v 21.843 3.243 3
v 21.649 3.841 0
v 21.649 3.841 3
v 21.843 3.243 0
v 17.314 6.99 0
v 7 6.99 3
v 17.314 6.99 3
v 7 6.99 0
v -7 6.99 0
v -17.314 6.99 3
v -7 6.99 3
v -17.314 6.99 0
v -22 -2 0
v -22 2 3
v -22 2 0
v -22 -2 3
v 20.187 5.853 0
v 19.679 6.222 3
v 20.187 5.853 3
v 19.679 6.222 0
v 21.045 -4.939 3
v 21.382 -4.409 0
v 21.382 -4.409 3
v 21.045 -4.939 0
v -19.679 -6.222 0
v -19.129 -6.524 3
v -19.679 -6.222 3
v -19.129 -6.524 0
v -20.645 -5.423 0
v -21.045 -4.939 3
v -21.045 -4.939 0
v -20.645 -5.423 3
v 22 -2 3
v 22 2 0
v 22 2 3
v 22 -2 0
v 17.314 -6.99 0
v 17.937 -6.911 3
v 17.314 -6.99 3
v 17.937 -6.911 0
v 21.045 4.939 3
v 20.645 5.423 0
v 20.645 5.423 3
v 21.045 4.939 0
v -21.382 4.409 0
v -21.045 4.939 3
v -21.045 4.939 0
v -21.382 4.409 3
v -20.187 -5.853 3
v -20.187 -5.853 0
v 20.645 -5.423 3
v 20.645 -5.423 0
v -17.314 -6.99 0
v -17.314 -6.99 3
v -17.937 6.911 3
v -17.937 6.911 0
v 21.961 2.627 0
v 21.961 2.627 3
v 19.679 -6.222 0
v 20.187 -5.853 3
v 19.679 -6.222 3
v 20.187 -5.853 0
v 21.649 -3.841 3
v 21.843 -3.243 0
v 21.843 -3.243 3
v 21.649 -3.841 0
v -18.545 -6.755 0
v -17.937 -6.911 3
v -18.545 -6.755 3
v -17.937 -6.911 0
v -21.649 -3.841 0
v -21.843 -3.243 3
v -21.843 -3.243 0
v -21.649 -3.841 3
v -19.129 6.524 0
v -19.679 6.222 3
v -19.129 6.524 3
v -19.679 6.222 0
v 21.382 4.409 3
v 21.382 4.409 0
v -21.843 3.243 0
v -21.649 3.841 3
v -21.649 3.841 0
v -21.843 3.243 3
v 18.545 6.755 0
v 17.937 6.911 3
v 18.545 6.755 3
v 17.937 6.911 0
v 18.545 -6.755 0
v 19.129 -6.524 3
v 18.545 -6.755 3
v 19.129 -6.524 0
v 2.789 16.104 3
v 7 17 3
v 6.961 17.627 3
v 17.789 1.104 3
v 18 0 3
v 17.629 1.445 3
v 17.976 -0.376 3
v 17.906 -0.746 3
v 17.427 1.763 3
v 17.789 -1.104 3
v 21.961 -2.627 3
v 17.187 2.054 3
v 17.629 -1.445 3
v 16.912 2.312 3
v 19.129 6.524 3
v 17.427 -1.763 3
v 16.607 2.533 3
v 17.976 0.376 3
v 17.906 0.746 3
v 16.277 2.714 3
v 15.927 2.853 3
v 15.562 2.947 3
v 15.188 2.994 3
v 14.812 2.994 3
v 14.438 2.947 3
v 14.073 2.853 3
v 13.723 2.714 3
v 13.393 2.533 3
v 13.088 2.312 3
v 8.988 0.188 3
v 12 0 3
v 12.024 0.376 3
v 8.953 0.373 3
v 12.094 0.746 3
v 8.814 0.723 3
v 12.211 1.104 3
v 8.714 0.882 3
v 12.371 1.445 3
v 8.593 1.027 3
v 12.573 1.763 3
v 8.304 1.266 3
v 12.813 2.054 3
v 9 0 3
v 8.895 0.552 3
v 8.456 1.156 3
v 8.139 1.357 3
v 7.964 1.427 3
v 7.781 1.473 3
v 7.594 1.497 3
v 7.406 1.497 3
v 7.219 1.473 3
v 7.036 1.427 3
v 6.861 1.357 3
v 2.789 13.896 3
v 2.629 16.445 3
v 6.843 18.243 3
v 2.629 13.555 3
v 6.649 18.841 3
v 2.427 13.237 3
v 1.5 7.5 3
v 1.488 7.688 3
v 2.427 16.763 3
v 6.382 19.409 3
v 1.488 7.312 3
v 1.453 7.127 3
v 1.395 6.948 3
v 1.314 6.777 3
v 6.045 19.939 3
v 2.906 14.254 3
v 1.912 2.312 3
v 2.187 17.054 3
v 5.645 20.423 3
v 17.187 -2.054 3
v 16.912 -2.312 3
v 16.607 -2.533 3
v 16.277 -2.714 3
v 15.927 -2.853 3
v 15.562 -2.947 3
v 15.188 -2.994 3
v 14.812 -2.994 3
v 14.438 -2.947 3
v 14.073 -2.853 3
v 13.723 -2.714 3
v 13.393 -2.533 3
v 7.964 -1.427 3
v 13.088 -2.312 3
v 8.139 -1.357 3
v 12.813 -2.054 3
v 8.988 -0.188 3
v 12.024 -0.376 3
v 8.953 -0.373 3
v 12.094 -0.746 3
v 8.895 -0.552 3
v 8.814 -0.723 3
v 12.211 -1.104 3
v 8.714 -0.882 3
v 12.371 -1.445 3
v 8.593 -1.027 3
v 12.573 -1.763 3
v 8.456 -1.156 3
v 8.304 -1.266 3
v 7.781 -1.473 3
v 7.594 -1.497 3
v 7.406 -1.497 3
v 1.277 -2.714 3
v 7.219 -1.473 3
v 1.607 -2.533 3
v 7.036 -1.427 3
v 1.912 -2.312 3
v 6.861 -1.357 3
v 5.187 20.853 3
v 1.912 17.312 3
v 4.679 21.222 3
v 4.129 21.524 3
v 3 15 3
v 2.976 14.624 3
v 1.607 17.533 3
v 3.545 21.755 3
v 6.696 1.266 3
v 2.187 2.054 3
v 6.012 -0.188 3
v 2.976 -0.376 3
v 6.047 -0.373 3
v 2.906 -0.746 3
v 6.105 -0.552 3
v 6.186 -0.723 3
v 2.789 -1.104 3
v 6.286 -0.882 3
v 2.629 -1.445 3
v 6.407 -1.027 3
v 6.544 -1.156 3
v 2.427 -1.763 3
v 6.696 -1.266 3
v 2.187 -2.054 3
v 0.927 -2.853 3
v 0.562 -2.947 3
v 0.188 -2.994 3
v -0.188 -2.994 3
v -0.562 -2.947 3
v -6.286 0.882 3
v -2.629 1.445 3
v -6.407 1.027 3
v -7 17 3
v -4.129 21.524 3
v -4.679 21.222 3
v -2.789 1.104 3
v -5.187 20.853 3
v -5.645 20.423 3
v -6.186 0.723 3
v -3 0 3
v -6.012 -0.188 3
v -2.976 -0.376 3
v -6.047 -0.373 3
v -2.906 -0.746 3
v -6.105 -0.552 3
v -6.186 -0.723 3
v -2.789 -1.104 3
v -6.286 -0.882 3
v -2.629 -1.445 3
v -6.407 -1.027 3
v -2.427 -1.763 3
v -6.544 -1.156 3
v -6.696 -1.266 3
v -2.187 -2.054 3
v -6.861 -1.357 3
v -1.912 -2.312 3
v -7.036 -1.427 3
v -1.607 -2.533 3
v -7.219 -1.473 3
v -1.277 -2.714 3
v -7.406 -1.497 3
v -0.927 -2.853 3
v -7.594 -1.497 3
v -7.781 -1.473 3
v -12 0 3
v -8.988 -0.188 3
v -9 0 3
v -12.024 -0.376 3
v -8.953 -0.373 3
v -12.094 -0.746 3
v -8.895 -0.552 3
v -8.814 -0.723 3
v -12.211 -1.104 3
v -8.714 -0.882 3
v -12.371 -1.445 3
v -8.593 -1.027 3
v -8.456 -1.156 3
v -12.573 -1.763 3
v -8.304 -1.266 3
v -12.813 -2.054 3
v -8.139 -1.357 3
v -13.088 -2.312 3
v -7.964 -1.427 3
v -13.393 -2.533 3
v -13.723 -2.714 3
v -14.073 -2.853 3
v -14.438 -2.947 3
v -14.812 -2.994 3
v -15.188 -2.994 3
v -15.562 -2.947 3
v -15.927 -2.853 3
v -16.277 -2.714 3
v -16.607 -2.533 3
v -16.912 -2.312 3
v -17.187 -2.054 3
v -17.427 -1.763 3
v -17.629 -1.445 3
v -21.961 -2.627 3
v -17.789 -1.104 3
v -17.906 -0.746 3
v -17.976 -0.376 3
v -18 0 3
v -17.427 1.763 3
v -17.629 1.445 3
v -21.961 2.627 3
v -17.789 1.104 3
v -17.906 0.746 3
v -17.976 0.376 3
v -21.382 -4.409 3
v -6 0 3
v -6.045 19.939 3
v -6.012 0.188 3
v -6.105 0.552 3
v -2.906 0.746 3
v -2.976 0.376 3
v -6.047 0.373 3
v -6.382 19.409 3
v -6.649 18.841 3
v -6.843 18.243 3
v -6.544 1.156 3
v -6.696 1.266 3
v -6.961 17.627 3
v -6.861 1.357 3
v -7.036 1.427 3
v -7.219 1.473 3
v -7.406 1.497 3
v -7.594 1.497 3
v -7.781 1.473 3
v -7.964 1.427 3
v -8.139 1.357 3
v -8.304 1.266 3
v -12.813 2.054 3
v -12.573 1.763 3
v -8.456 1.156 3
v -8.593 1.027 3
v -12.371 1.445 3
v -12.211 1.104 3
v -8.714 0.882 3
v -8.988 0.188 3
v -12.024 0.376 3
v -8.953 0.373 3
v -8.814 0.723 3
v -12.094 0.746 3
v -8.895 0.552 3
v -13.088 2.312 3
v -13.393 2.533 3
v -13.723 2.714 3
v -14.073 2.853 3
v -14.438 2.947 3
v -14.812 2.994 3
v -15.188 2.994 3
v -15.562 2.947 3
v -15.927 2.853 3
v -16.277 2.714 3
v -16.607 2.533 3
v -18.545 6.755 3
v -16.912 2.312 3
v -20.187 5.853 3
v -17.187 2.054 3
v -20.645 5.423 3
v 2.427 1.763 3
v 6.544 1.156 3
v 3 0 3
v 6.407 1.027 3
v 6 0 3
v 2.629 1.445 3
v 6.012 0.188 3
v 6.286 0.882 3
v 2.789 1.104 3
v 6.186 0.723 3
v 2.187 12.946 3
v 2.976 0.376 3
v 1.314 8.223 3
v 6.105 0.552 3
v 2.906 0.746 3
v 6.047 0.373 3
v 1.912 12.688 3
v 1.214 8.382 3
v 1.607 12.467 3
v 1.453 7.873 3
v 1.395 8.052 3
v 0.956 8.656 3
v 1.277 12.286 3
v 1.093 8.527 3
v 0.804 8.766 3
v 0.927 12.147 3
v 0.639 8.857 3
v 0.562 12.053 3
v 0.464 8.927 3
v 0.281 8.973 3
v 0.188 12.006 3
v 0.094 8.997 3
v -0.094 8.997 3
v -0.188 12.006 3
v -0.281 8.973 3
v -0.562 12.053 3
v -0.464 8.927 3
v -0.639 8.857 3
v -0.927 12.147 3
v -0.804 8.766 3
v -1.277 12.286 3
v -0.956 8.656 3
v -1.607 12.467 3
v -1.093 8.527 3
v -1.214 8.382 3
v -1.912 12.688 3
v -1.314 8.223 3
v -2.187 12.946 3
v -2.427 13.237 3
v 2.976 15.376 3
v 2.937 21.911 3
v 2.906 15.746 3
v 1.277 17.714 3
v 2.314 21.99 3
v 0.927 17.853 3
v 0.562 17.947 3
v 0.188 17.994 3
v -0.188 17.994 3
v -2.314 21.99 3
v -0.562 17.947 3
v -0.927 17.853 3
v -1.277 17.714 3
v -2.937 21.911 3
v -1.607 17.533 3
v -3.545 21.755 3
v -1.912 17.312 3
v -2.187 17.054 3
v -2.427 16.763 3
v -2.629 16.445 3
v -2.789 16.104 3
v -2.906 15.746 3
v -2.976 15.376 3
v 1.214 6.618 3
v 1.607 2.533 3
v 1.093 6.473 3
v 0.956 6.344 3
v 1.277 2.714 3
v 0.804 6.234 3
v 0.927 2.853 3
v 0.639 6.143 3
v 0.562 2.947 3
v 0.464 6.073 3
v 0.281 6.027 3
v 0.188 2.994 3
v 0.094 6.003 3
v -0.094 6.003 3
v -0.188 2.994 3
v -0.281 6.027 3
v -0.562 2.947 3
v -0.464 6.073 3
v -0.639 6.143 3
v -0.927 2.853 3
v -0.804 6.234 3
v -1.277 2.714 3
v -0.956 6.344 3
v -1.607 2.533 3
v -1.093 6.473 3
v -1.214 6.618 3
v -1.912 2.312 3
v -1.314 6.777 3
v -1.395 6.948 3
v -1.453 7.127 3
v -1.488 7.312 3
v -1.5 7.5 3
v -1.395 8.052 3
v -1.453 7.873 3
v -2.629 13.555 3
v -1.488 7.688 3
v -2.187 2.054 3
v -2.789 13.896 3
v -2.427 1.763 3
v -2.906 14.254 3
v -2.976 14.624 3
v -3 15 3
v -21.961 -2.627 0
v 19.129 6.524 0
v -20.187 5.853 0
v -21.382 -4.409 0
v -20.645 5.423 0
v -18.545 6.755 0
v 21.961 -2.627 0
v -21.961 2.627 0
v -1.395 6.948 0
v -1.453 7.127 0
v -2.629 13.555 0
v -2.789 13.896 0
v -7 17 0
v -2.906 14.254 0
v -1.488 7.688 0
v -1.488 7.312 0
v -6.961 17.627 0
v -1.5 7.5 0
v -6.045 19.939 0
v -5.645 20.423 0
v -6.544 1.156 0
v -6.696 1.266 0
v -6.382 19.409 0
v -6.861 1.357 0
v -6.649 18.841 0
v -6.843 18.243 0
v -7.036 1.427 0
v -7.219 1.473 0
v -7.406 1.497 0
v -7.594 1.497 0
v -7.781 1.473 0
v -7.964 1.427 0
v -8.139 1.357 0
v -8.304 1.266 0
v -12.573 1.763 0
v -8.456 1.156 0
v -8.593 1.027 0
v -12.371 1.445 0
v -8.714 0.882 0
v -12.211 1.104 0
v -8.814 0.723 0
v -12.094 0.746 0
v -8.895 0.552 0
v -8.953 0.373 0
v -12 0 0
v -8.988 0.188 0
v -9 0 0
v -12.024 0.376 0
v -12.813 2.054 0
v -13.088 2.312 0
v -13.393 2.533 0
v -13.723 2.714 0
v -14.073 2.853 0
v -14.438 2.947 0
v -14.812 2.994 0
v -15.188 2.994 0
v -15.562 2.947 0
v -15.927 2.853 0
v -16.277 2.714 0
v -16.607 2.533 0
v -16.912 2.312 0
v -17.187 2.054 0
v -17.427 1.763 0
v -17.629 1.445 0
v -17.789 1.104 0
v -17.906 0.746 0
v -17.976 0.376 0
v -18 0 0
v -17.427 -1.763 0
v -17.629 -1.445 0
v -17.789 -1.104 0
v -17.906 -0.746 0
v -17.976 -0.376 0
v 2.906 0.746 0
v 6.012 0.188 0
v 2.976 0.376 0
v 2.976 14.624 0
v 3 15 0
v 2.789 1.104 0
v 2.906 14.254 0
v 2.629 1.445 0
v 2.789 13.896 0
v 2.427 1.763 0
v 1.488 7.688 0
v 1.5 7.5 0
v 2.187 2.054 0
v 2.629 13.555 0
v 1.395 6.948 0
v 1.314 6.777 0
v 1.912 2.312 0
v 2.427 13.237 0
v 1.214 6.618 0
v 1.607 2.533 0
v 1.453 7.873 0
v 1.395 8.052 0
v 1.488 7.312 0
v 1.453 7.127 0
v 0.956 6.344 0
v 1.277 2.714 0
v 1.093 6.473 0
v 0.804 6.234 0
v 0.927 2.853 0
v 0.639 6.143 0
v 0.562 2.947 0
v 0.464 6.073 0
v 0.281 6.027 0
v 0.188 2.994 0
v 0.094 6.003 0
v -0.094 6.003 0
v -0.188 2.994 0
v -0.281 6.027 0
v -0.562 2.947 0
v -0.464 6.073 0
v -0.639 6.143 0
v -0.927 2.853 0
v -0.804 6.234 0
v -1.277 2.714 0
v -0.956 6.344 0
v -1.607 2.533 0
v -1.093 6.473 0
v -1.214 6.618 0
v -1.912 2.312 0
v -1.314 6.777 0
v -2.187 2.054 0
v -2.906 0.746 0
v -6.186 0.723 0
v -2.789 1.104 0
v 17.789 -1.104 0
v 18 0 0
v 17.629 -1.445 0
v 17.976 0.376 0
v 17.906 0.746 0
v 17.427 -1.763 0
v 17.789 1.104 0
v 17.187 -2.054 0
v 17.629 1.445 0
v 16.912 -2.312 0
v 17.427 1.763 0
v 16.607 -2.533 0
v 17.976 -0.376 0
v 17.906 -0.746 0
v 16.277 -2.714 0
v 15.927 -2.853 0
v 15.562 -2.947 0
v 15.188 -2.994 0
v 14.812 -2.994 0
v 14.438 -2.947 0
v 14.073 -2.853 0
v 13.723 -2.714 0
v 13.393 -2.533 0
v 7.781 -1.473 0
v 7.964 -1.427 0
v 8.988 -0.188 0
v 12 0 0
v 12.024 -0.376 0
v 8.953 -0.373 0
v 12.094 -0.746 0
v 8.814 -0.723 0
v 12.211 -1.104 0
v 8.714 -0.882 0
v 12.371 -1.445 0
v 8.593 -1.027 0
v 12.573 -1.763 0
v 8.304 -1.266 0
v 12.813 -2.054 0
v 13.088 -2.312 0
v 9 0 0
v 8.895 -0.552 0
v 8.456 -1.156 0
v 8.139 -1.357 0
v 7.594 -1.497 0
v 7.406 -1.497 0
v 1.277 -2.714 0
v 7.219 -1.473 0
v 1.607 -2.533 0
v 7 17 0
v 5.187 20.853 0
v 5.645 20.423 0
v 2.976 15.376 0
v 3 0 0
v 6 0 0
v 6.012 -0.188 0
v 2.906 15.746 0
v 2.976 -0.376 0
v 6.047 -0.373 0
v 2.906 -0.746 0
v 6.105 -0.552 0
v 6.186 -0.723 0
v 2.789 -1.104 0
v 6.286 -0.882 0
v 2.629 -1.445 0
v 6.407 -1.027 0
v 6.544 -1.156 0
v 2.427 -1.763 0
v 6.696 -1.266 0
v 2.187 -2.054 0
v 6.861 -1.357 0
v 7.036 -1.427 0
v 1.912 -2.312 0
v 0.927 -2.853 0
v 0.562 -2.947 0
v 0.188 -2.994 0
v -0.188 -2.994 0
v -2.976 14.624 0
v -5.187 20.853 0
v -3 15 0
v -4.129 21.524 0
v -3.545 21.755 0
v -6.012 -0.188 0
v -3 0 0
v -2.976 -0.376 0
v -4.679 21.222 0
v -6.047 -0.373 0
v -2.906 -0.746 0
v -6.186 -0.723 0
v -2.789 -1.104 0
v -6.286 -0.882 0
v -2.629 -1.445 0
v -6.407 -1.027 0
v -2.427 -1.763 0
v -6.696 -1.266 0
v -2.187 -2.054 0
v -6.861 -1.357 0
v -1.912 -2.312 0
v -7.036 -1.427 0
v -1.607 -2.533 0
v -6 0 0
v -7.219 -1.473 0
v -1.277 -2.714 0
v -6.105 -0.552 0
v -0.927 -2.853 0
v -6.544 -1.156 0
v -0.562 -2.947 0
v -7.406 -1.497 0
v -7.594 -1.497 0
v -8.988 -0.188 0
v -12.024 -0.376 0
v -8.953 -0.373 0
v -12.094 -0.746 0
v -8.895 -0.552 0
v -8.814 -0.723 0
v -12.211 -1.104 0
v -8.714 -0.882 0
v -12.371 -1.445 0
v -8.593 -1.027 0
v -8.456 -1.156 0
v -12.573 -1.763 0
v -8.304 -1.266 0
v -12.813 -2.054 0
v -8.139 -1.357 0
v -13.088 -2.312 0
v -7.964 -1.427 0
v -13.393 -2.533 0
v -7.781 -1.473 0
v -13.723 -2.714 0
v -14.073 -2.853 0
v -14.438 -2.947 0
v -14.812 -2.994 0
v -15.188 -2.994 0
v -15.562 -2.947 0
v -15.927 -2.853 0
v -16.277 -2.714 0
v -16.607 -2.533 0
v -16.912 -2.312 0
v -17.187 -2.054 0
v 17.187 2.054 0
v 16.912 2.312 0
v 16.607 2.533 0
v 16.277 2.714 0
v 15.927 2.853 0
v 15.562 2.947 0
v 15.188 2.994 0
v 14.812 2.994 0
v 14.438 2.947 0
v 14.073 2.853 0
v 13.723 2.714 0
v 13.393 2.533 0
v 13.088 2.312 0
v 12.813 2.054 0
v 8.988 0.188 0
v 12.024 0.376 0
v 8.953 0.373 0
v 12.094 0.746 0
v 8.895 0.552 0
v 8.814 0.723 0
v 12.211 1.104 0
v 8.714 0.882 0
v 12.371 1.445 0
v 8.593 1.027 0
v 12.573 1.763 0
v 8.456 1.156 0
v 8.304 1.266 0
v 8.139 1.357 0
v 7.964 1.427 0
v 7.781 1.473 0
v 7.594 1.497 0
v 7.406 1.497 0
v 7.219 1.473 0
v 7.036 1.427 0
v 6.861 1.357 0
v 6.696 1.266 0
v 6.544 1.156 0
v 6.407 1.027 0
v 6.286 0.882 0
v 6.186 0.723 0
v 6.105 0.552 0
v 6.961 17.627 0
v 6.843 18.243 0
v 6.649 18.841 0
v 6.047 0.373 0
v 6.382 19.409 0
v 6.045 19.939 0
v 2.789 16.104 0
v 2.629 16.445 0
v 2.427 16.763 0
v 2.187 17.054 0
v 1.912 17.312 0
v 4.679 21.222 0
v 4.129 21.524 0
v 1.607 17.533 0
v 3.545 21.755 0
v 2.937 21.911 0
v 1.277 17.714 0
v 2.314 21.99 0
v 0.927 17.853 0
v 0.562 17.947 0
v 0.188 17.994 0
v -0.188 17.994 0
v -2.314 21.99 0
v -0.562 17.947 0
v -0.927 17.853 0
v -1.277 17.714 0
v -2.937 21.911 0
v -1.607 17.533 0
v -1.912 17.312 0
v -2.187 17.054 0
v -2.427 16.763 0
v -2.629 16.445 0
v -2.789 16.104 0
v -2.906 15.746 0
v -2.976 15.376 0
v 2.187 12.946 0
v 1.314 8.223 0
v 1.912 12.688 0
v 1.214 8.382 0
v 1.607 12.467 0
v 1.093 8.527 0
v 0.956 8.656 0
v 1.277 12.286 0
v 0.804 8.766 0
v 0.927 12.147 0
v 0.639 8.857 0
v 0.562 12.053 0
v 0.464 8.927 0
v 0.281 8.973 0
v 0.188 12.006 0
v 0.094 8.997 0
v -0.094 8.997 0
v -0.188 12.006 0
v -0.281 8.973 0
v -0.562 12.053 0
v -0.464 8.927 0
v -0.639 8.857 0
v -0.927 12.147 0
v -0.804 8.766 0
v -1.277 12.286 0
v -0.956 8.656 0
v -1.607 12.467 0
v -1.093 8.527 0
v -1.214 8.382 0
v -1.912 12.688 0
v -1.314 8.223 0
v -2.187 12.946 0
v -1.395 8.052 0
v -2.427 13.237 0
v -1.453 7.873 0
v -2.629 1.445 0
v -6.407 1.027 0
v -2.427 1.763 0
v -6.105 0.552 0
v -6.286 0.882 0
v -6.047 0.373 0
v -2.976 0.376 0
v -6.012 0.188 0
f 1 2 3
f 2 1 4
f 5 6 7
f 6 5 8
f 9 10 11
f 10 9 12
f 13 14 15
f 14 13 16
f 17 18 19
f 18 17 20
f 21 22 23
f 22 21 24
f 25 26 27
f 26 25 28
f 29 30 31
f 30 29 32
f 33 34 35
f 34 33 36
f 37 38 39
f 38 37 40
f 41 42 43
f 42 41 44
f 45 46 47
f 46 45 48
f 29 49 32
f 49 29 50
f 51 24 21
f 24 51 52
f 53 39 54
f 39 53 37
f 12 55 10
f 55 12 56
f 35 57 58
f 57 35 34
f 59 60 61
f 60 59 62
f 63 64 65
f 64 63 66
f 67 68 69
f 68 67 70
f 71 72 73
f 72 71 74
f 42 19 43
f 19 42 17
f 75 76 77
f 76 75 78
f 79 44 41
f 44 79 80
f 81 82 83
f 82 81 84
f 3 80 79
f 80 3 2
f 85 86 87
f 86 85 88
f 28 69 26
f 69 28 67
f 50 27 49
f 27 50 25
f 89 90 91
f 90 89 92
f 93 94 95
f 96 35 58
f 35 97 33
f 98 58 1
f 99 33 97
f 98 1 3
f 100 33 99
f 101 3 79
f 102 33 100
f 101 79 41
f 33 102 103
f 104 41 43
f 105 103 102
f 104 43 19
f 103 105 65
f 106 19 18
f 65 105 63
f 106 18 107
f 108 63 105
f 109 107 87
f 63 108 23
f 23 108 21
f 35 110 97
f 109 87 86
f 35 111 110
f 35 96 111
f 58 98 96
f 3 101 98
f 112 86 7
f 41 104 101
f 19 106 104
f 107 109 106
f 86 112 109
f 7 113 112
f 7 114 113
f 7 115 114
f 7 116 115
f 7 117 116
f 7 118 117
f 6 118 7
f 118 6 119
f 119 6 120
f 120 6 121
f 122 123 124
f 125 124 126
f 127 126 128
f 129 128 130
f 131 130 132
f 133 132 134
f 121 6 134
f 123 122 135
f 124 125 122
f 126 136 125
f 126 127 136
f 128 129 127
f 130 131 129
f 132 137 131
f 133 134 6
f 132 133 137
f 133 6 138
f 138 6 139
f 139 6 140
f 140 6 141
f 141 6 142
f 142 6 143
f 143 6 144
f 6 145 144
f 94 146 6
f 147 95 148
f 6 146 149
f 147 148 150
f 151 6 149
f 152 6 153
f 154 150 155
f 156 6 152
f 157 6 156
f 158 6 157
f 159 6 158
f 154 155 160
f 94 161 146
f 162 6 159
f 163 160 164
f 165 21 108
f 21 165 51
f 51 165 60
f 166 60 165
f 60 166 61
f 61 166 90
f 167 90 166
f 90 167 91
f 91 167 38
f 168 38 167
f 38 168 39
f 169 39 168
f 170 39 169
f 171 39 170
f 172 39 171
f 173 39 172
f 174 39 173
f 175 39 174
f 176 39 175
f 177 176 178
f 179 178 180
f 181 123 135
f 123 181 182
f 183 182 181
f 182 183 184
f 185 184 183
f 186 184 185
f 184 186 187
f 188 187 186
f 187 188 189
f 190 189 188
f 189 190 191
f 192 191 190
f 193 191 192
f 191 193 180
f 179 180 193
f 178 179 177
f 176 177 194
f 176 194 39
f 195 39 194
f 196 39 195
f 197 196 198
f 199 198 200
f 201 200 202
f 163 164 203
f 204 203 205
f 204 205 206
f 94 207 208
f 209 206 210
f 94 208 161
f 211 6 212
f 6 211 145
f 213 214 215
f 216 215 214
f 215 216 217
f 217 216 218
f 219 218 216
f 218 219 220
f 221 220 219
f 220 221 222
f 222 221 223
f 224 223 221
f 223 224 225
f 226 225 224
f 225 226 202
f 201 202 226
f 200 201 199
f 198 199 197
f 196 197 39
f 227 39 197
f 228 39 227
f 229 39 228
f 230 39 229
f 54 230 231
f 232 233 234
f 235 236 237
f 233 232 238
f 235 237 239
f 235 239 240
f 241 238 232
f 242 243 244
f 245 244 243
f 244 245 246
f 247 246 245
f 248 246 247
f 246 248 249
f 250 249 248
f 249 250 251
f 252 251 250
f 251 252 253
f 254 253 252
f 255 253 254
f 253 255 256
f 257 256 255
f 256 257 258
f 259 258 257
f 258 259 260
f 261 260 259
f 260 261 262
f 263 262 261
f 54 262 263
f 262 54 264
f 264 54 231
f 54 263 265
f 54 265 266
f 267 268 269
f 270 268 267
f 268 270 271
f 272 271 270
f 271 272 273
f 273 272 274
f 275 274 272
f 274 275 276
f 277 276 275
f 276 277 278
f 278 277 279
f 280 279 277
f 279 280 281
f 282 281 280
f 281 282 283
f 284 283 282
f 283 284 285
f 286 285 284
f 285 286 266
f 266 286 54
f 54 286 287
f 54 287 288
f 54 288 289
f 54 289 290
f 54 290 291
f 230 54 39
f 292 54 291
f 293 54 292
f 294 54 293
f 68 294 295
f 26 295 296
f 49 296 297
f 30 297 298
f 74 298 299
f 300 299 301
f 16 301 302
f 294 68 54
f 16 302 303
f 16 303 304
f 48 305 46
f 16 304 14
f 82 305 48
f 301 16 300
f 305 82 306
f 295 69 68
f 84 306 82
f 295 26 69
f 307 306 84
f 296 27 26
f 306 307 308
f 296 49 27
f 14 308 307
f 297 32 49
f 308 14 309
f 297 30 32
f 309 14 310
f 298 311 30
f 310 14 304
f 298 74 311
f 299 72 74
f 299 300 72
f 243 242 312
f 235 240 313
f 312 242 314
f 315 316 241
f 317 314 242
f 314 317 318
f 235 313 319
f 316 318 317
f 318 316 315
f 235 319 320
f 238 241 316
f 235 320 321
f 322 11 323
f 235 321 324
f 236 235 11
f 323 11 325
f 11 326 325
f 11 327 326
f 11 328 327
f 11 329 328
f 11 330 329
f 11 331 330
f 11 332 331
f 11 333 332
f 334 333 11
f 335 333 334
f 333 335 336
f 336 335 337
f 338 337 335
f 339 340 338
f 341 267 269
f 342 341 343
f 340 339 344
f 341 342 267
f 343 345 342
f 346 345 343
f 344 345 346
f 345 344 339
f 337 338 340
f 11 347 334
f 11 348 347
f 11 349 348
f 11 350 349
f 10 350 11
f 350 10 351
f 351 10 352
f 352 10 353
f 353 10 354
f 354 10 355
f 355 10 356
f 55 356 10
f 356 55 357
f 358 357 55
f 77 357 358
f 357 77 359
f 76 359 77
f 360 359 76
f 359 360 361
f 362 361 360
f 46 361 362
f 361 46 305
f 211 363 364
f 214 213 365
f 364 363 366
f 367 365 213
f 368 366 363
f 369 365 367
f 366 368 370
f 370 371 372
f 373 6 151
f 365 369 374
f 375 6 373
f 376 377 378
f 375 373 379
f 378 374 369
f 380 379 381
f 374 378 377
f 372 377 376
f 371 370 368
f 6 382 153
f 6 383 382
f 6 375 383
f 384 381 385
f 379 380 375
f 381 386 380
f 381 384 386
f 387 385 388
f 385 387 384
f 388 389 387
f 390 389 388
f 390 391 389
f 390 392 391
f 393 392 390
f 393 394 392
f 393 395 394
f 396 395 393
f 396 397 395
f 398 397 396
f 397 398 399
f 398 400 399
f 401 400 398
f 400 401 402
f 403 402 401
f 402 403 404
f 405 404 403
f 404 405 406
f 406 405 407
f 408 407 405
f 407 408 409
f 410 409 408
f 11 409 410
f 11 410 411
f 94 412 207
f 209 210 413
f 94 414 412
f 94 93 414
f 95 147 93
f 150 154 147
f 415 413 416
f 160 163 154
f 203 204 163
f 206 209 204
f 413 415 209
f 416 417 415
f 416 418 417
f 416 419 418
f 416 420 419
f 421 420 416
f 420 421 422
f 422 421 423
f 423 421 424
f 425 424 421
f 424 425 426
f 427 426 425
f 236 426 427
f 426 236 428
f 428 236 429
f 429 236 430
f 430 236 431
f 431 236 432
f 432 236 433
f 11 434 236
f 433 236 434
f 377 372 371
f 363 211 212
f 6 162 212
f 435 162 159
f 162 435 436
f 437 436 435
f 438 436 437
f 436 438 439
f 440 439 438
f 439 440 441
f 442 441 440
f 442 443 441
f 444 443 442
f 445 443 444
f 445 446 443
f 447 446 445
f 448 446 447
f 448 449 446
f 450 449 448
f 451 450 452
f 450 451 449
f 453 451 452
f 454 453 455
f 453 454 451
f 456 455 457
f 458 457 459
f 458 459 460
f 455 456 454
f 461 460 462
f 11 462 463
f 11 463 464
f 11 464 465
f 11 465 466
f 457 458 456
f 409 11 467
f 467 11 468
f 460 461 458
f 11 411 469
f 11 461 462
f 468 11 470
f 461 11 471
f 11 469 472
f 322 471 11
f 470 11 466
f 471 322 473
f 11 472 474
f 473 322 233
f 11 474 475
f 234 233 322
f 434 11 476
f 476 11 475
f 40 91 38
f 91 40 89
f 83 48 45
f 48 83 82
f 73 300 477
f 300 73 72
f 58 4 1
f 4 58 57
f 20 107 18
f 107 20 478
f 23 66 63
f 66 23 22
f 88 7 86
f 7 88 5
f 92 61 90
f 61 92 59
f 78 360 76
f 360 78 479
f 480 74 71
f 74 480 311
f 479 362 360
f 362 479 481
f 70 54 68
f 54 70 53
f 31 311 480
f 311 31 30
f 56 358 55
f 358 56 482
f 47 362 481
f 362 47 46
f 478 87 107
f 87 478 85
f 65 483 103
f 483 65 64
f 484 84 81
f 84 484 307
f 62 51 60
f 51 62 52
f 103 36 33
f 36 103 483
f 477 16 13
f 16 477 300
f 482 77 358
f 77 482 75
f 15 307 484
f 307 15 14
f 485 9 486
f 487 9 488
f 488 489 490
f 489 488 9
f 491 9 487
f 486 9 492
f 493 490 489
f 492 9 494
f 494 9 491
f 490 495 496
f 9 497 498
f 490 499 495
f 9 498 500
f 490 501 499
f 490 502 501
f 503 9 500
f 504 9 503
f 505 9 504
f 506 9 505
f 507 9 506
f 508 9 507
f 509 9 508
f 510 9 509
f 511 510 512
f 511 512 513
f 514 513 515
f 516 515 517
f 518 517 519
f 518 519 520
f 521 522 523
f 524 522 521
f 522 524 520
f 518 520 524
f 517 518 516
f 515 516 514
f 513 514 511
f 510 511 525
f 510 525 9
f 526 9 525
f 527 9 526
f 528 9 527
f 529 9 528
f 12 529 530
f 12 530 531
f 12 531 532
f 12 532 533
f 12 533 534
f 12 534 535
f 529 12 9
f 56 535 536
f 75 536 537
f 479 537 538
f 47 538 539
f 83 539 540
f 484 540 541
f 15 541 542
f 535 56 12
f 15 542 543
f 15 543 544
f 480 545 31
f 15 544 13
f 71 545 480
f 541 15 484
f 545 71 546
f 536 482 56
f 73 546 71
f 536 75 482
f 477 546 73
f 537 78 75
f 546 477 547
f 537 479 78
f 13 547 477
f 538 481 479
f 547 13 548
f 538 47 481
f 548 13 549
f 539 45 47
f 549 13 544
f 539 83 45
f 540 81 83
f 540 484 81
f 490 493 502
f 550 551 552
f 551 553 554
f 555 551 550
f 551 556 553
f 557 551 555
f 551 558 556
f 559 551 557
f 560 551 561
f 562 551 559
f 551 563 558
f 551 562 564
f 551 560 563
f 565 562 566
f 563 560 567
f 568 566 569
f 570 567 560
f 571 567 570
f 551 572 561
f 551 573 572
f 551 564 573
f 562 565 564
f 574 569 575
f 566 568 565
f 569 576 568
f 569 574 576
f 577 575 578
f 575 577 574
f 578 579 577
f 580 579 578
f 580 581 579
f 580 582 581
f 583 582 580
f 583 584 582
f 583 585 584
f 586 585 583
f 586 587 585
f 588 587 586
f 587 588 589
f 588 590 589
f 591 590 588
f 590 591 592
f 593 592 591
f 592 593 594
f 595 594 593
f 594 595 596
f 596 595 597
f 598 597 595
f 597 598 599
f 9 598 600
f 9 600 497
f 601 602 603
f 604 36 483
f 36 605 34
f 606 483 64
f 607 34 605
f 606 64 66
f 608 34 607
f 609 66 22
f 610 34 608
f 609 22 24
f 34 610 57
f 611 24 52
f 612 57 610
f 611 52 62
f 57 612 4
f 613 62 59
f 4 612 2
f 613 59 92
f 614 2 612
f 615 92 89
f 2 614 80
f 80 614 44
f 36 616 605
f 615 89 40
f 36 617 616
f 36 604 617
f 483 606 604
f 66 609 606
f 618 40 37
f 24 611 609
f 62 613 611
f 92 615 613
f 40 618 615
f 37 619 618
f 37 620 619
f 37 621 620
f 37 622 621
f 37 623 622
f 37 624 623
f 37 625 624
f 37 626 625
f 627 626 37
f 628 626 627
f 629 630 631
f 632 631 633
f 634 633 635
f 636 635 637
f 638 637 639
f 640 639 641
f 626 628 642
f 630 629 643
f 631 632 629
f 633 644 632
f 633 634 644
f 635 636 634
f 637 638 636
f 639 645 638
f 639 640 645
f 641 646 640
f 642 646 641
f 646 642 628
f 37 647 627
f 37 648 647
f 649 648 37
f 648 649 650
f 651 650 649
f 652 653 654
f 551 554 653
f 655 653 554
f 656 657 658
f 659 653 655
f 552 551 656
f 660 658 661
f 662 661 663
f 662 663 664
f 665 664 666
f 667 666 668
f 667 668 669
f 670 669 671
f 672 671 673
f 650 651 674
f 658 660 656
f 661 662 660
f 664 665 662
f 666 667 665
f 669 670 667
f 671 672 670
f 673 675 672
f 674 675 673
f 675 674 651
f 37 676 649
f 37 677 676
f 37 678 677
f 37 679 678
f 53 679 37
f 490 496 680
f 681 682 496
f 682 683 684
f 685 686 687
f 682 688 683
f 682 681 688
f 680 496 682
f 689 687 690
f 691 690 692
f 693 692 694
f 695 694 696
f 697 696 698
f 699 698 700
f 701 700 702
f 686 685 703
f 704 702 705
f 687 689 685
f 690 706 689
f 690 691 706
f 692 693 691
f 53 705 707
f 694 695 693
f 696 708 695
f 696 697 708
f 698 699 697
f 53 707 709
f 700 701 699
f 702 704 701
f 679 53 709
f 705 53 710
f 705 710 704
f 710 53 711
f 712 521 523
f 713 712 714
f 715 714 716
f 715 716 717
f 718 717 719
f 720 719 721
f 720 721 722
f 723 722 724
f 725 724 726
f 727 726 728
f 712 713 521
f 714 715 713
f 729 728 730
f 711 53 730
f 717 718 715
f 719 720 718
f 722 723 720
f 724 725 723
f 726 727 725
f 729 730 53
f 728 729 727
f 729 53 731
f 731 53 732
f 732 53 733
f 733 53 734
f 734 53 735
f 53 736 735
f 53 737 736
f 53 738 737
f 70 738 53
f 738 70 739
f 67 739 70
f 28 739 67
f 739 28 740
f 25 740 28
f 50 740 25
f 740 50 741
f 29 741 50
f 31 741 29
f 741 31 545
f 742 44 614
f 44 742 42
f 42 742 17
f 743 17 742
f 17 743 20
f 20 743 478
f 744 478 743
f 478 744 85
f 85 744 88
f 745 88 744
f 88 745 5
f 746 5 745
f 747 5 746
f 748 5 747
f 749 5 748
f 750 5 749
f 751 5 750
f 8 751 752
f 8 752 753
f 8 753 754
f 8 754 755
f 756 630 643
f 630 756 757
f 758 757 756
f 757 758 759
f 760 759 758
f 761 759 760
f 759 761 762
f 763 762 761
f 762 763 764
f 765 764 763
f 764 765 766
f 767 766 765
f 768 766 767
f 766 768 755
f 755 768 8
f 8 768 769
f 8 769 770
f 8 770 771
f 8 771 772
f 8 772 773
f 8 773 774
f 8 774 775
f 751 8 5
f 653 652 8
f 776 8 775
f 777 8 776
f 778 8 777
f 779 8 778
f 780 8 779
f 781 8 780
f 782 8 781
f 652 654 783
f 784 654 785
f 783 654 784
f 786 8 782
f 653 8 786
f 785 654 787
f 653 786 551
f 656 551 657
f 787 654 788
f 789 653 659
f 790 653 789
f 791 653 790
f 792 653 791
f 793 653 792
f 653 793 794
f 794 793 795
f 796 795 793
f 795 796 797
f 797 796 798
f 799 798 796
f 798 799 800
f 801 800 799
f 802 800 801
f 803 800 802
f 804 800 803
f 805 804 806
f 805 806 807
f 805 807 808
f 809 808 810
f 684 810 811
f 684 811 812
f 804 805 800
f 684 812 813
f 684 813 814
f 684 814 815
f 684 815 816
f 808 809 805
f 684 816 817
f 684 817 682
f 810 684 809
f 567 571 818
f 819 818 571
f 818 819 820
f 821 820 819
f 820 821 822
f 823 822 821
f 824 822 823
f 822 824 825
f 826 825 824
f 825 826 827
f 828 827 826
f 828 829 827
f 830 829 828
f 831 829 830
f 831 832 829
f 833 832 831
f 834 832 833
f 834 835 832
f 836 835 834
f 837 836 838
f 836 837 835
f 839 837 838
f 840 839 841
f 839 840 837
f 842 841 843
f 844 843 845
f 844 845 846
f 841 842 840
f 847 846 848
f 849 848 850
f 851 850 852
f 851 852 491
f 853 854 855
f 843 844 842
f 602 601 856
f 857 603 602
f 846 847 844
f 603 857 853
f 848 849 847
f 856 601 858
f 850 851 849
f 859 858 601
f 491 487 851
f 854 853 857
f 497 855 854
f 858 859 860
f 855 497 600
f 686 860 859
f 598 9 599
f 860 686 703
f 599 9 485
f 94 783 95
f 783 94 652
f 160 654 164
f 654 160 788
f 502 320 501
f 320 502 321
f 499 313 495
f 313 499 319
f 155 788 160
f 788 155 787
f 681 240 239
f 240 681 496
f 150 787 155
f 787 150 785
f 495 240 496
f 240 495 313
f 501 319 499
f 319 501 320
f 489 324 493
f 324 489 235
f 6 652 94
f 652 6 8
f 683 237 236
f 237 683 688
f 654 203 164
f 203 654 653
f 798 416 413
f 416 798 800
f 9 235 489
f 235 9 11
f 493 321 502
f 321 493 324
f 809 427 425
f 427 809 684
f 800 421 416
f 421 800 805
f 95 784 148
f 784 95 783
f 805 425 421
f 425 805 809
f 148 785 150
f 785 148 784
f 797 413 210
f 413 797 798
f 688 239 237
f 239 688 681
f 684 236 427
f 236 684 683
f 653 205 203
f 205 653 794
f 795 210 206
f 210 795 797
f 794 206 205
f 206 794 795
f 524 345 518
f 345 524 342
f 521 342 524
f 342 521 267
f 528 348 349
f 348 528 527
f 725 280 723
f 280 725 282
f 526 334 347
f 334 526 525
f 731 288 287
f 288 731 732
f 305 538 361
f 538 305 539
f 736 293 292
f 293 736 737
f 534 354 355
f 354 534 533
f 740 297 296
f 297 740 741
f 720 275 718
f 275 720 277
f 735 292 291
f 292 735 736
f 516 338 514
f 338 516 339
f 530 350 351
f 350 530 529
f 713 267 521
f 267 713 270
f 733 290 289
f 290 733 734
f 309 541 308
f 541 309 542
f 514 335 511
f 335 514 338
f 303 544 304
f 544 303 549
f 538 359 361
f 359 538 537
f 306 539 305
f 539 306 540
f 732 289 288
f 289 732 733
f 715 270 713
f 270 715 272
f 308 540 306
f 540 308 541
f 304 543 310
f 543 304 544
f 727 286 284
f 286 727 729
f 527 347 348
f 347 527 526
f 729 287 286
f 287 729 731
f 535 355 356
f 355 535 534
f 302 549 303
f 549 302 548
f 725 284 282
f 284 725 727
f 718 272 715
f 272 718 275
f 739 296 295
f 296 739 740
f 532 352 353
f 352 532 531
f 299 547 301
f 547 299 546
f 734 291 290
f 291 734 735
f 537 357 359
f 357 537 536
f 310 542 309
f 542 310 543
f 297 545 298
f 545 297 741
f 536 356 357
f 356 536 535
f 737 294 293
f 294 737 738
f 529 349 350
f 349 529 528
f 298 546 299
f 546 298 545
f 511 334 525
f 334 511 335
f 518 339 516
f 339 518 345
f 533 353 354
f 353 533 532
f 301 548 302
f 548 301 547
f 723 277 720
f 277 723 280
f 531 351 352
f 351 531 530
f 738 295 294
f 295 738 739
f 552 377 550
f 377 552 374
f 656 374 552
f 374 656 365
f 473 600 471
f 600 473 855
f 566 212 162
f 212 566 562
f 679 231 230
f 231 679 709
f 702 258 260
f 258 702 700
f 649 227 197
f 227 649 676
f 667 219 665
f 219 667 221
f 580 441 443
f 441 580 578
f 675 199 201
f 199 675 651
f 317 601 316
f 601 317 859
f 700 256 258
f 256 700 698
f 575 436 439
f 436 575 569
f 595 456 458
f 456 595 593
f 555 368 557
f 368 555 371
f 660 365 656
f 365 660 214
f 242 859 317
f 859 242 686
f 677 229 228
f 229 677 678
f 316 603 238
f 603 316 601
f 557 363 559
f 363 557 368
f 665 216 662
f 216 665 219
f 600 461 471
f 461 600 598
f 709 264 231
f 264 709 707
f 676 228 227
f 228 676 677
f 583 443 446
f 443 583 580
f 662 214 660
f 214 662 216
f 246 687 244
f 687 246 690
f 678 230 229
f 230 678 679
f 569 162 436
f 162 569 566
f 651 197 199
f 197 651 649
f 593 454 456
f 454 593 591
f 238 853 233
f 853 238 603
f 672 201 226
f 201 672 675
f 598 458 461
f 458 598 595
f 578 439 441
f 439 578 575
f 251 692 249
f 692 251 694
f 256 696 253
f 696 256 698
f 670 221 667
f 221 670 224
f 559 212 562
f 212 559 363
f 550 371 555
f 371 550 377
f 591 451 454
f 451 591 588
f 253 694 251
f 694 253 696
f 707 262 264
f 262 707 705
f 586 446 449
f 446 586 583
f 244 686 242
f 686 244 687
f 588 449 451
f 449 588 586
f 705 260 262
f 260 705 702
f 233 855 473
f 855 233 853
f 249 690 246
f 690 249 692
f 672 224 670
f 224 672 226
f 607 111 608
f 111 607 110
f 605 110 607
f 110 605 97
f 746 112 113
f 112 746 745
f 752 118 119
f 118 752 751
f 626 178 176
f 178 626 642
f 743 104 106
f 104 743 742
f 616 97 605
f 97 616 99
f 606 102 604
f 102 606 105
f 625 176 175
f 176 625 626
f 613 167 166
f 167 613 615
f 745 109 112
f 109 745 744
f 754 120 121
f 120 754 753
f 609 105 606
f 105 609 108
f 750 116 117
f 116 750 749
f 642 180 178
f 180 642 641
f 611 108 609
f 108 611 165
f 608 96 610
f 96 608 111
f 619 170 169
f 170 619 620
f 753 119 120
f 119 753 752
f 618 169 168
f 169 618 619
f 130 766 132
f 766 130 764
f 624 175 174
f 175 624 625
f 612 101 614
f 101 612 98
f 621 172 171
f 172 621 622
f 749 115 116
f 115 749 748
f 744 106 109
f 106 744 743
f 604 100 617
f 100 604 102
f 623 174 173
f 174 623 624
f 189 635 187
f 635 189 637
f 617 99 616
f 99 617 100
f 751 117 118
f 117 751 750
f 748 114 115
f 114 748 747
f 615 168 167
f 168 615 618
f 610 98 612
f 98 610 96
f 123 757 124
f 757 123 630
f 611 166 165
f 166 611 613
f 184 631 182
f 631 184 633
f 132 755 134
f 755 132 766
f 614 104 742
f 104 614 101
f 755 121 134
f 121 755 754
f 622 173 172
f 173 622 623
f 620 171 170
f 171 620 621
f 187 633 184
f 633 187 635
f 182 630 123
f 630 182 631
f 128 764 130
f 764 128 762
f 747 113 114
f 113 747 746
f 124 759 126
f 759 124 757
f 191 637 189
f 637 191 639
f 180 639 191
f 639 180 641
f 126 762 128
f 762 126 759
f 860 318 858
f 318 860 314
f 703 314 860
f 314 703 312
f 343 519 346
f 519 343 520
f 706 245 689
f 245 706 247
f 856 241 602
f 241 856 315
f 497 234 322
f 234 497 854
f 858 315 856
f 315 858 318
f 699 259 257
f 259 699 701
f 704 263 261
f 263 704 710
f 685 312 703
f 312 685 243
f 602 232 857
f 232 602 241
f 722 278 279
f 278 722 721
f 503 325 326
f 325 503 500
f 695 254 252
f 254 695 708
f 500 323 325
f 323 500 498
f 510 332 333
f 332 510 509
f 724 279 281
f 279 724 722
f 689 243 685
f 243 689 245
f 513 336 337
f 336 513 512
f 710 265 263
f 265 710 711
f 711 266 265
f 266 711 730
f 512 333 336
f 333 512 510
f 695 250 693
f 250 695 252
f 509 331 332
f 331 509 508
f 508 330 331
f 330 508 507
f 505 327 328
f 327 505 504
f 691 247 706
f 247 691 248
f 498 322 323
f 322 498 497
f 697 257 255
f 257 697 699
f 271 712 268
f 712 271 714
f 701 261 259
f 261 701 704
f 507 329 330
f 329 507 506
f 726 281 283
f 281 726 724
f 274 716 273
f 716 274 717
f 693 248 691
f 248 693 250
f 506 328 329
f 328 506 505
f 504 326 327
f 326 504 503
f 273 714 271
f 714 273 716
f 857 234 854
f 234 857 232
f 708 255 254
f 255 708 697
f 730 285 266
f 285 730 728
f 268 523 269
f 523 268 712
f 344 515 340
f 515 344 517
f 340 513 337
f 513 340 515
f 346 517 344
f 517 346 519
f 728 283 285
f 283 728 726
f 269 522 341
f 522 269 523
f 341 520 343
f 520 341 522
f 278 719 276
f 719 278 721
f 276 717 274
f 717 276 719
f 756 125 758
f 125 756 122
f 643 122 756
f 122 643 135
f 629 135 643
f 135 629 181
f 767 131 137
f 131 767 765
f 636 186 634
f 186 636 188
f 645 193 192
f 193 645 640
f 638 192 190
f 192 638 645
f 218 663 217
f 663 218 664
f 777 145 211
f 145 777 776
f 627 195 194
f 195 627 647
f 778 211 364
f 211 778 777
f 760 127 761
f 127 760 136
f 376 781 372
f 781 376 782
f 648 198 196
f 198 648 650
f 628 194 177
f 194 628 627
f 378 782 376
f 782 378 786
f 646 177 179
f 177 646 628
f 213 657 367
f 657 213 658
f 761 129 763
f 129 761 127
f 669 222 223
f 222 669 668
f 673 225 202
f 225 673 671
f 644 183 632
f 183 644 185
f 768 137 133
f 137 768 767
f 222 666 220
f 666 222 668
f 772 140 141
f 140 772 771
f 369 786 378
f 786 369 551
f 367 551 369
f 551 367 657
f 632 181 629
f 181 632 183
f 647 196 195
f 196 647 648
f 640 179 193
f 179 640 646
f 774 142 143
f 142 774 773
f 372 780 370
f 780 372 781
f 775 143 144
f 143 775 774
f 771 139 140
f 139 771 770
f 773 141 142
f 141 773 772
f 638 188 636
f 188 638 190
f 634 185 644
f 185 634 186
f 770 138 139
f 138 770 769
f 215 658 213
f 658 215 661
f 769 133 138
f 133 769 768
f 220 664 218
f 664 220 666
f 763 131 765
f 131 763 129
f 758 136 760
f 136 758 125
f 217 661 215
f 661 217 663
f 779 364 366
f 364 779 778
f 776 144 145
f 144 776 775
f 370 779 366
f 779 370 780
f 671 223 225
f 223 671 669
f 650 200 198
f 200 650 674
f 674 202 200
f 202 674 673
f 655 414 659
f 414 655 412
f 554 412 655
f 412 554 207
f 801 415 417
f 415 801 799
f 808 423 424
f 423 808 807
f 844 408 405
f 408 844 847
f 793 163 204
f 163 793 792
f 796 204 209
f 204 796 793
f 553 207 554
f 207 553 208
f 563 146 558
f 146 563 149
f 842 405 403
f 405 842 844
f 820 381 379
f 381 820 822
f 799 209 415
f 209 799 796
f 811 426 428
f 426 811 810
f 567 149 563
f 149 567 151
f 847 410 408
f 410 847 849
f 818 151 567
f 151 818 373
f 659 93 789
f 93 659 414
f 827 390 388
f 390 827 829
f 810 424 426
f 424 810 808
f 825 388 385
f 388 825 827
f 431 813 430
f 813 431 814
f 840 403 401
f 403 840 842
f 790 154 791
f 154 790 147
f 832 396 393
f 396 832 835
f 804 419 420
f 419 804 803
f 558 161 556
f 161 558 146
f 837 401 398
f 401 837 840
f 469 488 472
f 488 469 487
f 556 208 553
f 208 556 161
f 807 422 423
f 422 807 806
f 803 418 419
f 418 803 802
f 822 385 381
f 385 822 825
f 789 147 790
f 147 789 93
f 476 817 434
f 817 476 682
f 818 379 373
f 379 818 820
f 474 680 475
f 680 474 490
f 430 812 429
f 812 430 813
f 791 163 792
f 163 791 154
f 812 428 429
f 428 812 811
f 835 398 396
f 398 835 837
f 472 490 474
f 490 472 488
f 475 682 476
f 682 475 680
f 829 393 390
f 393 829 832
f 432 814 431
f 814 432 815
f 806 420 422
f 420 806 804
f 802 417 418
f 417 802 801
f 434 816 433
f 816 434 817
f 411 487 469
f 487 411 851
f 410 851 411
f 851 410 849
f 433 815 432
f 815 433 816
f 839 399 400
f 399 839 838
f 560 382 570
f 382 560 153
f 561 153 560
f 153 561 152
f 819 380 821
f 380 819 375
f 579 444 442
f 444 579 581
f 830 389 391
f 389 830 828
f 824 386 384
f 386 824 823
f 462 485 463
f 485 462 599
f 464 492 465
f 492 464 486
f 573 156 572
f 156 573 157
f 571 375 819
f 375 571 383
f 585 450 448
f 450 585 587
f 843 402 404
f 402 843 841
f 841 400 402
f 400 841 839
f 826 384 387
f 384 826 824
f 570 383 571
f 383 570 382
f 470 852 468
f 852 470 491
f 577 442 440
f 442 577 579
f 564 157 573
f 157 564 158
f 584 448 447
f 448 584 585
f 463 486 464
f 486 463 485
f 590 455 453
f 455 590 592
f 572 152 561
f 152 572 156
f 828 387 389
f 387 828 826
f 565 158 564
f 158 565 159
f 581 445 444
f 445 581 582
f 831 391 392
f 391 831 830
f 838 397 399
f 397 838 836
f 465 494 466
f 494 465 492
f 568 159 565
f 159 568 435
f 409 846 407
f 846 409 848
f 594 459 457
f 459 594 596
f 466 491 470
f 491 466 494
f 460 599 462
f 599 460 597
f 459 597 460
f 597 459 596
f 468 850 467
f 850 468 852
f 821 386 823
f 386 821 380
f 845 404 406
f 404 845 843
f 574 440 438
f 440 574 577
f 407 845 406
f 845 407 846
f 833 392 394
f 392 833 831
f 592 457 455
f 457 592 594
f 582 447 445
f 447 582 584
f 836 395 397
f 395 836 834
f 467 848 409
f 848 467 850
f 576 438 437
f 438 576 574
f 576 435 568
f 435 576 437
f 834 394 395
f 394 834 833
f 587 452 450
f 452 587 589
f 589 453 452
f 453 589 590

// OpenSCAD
$fn = 50;


difference() {
	union() {
		*color(alpha = 1.0000000000, c = "gray") {
			translate(v = [0, 7, 0]) {
				linear_extrude(height = 1) {
					text(font = "Arial:style=Bold", halign = "center", size = 4.5000000000, text = "COMMENT plate main", valign = "center");
				}
			}
		}
		hull() {
			translate(v = [-17.0000000000, 2.0000000000, 0]) {
				cylinder(h = 3, r = 5);
			}
			translate(v = [17.0000000000, 2.0000000000, 0]) {
				cylinder(h = 3, r = 5);
			}
			translate(v = [-17.0000000000, -2.0000000000, 0]) {
				cylinder(h = 3, r = 5);
			}
			translate(v = [17.0000000000, -2.0000000000, 0]) {
				cylinder(h = 3, r = 5);
			}
		}
		*color(alpha = 1.0000000000, c = "gray") {
			translate(v = [0, 7, 0]) {
				linear_extrude(height = 1) {
					text(font = "Arial:style=Bold", halign = "center", size = 4.5000000000, text = "COMMENT plate main", valign = "center");
				}
			}
		}
		translate(v = [0, 7.5000000000, 0]) {
			hull() {
				translate(v = [-2.0000000000, 9.5000000000, 0]) {
					cylinder(h = 3, r = 5);
				}
				translate(v = [2.0000000000, 9.5000000000, 0]) {
					cylinder(h = 3, r = 5);
				}
				translate(v = [-2.0000000000, -9.5000000000, 0]) {
					cylinder(h = 3, r = 5);
				}
				translate(v = [2.0000000000, -9.5000000000, 0]) {
					cylinder(h = 3, r = 5);
				}
			}
		}
	}
	union() {
		*color(alpha = 1.0000000000, c = "gray") {
			translate(v = [0, 7, 0]) {
				linear_extrude(height = 1) {
					text(font = "Arial:style=Bold", halign = "center", size = 4.5000000000, text = "COMMENT holes main", valign = "center");
				}
			}
		}
		translate(v = [-15.0000000000, 0.0000000000, 0]) {
			translate(v = [0, 0, -100]) {
				cylinder(h = 200, r = 3.0000000000);
			}
		}
		translate(v = [0, 0, -100]) {
			cylinder(h = 200, r = 3.0000000000);
		}
		translate(v = [15.0000000000, 0.0000000000, 0]) {
			translate(v = [0, 0, -100]) {
				cylinder(h = 200, r = 3.0000000000);
			}
		}
		translate(v = [-15.0000000000, 0.0000000000, 0]) {
			translate(v = [0, 0, -100]) {
				cylinder(h = 200, r = 1.5000000000);
			}
		}
		translate(v = [-7.5000000000, 0.0000000000, 0]) {
			translate(v = [0, 0, -100]) {
				cylinder(h = 200, r = 1.5000000000);
			}
		}
		translate(v = [0, 0, -100]) {
			cylinder(h = 200, r = 1.5000000000);
		}
		translate(v = [7.5000000000, 0.0000000000, 0]) {
			translate(v = [0, 0, -100]) {
				cylinder(h = 200, r = 1.5000000000);
			}
		}
		translate(v = [15.0000000000, 0.0000000000, 0]) {
			translate(v = [0, 0, -100]) {
				cylinder(h = 200, r = 1.5000000000);
			}
		}
		*color(alpha = 1.0000000000, c = "gray") {
			translate(v = [0, 7, 0]) {
				linear_extrude(height = 1) {
					text(font = "Arial:style=Bold", halign = "center", size = 4.5000000000, text = "COMMENT holes main", valign = "center");
				}
			}
		}
		translate(v = [0, 0, -100]) {
			cylinder(h = 200, r = 3.0000000000);
		}
		translate(v = [0.0000000000, 15.0000000000, 0]) {
			translate(v = [0, 0, -100]) {
				cylinder(h = 200, r = 3.0000000000);
			}
		}
		translate(v = [0, 0, -100]) {
			cylinder(h = 200, r = 1.5000000000);
		}
		translate(v = [0.0000000000, 7.5000000000, 0]) {
			translate(v = [0, 0, -100]) {
				cylinder(h = 200, r = 1.5000000000);
			}
		}
		translate(v = [0.0000000000, 15.0000000000, 0]) {
			translate(v = [0, 0, -100]) {
				cylinder(h = 200, r = 1.5000000000);
			}
		}
	}
}
